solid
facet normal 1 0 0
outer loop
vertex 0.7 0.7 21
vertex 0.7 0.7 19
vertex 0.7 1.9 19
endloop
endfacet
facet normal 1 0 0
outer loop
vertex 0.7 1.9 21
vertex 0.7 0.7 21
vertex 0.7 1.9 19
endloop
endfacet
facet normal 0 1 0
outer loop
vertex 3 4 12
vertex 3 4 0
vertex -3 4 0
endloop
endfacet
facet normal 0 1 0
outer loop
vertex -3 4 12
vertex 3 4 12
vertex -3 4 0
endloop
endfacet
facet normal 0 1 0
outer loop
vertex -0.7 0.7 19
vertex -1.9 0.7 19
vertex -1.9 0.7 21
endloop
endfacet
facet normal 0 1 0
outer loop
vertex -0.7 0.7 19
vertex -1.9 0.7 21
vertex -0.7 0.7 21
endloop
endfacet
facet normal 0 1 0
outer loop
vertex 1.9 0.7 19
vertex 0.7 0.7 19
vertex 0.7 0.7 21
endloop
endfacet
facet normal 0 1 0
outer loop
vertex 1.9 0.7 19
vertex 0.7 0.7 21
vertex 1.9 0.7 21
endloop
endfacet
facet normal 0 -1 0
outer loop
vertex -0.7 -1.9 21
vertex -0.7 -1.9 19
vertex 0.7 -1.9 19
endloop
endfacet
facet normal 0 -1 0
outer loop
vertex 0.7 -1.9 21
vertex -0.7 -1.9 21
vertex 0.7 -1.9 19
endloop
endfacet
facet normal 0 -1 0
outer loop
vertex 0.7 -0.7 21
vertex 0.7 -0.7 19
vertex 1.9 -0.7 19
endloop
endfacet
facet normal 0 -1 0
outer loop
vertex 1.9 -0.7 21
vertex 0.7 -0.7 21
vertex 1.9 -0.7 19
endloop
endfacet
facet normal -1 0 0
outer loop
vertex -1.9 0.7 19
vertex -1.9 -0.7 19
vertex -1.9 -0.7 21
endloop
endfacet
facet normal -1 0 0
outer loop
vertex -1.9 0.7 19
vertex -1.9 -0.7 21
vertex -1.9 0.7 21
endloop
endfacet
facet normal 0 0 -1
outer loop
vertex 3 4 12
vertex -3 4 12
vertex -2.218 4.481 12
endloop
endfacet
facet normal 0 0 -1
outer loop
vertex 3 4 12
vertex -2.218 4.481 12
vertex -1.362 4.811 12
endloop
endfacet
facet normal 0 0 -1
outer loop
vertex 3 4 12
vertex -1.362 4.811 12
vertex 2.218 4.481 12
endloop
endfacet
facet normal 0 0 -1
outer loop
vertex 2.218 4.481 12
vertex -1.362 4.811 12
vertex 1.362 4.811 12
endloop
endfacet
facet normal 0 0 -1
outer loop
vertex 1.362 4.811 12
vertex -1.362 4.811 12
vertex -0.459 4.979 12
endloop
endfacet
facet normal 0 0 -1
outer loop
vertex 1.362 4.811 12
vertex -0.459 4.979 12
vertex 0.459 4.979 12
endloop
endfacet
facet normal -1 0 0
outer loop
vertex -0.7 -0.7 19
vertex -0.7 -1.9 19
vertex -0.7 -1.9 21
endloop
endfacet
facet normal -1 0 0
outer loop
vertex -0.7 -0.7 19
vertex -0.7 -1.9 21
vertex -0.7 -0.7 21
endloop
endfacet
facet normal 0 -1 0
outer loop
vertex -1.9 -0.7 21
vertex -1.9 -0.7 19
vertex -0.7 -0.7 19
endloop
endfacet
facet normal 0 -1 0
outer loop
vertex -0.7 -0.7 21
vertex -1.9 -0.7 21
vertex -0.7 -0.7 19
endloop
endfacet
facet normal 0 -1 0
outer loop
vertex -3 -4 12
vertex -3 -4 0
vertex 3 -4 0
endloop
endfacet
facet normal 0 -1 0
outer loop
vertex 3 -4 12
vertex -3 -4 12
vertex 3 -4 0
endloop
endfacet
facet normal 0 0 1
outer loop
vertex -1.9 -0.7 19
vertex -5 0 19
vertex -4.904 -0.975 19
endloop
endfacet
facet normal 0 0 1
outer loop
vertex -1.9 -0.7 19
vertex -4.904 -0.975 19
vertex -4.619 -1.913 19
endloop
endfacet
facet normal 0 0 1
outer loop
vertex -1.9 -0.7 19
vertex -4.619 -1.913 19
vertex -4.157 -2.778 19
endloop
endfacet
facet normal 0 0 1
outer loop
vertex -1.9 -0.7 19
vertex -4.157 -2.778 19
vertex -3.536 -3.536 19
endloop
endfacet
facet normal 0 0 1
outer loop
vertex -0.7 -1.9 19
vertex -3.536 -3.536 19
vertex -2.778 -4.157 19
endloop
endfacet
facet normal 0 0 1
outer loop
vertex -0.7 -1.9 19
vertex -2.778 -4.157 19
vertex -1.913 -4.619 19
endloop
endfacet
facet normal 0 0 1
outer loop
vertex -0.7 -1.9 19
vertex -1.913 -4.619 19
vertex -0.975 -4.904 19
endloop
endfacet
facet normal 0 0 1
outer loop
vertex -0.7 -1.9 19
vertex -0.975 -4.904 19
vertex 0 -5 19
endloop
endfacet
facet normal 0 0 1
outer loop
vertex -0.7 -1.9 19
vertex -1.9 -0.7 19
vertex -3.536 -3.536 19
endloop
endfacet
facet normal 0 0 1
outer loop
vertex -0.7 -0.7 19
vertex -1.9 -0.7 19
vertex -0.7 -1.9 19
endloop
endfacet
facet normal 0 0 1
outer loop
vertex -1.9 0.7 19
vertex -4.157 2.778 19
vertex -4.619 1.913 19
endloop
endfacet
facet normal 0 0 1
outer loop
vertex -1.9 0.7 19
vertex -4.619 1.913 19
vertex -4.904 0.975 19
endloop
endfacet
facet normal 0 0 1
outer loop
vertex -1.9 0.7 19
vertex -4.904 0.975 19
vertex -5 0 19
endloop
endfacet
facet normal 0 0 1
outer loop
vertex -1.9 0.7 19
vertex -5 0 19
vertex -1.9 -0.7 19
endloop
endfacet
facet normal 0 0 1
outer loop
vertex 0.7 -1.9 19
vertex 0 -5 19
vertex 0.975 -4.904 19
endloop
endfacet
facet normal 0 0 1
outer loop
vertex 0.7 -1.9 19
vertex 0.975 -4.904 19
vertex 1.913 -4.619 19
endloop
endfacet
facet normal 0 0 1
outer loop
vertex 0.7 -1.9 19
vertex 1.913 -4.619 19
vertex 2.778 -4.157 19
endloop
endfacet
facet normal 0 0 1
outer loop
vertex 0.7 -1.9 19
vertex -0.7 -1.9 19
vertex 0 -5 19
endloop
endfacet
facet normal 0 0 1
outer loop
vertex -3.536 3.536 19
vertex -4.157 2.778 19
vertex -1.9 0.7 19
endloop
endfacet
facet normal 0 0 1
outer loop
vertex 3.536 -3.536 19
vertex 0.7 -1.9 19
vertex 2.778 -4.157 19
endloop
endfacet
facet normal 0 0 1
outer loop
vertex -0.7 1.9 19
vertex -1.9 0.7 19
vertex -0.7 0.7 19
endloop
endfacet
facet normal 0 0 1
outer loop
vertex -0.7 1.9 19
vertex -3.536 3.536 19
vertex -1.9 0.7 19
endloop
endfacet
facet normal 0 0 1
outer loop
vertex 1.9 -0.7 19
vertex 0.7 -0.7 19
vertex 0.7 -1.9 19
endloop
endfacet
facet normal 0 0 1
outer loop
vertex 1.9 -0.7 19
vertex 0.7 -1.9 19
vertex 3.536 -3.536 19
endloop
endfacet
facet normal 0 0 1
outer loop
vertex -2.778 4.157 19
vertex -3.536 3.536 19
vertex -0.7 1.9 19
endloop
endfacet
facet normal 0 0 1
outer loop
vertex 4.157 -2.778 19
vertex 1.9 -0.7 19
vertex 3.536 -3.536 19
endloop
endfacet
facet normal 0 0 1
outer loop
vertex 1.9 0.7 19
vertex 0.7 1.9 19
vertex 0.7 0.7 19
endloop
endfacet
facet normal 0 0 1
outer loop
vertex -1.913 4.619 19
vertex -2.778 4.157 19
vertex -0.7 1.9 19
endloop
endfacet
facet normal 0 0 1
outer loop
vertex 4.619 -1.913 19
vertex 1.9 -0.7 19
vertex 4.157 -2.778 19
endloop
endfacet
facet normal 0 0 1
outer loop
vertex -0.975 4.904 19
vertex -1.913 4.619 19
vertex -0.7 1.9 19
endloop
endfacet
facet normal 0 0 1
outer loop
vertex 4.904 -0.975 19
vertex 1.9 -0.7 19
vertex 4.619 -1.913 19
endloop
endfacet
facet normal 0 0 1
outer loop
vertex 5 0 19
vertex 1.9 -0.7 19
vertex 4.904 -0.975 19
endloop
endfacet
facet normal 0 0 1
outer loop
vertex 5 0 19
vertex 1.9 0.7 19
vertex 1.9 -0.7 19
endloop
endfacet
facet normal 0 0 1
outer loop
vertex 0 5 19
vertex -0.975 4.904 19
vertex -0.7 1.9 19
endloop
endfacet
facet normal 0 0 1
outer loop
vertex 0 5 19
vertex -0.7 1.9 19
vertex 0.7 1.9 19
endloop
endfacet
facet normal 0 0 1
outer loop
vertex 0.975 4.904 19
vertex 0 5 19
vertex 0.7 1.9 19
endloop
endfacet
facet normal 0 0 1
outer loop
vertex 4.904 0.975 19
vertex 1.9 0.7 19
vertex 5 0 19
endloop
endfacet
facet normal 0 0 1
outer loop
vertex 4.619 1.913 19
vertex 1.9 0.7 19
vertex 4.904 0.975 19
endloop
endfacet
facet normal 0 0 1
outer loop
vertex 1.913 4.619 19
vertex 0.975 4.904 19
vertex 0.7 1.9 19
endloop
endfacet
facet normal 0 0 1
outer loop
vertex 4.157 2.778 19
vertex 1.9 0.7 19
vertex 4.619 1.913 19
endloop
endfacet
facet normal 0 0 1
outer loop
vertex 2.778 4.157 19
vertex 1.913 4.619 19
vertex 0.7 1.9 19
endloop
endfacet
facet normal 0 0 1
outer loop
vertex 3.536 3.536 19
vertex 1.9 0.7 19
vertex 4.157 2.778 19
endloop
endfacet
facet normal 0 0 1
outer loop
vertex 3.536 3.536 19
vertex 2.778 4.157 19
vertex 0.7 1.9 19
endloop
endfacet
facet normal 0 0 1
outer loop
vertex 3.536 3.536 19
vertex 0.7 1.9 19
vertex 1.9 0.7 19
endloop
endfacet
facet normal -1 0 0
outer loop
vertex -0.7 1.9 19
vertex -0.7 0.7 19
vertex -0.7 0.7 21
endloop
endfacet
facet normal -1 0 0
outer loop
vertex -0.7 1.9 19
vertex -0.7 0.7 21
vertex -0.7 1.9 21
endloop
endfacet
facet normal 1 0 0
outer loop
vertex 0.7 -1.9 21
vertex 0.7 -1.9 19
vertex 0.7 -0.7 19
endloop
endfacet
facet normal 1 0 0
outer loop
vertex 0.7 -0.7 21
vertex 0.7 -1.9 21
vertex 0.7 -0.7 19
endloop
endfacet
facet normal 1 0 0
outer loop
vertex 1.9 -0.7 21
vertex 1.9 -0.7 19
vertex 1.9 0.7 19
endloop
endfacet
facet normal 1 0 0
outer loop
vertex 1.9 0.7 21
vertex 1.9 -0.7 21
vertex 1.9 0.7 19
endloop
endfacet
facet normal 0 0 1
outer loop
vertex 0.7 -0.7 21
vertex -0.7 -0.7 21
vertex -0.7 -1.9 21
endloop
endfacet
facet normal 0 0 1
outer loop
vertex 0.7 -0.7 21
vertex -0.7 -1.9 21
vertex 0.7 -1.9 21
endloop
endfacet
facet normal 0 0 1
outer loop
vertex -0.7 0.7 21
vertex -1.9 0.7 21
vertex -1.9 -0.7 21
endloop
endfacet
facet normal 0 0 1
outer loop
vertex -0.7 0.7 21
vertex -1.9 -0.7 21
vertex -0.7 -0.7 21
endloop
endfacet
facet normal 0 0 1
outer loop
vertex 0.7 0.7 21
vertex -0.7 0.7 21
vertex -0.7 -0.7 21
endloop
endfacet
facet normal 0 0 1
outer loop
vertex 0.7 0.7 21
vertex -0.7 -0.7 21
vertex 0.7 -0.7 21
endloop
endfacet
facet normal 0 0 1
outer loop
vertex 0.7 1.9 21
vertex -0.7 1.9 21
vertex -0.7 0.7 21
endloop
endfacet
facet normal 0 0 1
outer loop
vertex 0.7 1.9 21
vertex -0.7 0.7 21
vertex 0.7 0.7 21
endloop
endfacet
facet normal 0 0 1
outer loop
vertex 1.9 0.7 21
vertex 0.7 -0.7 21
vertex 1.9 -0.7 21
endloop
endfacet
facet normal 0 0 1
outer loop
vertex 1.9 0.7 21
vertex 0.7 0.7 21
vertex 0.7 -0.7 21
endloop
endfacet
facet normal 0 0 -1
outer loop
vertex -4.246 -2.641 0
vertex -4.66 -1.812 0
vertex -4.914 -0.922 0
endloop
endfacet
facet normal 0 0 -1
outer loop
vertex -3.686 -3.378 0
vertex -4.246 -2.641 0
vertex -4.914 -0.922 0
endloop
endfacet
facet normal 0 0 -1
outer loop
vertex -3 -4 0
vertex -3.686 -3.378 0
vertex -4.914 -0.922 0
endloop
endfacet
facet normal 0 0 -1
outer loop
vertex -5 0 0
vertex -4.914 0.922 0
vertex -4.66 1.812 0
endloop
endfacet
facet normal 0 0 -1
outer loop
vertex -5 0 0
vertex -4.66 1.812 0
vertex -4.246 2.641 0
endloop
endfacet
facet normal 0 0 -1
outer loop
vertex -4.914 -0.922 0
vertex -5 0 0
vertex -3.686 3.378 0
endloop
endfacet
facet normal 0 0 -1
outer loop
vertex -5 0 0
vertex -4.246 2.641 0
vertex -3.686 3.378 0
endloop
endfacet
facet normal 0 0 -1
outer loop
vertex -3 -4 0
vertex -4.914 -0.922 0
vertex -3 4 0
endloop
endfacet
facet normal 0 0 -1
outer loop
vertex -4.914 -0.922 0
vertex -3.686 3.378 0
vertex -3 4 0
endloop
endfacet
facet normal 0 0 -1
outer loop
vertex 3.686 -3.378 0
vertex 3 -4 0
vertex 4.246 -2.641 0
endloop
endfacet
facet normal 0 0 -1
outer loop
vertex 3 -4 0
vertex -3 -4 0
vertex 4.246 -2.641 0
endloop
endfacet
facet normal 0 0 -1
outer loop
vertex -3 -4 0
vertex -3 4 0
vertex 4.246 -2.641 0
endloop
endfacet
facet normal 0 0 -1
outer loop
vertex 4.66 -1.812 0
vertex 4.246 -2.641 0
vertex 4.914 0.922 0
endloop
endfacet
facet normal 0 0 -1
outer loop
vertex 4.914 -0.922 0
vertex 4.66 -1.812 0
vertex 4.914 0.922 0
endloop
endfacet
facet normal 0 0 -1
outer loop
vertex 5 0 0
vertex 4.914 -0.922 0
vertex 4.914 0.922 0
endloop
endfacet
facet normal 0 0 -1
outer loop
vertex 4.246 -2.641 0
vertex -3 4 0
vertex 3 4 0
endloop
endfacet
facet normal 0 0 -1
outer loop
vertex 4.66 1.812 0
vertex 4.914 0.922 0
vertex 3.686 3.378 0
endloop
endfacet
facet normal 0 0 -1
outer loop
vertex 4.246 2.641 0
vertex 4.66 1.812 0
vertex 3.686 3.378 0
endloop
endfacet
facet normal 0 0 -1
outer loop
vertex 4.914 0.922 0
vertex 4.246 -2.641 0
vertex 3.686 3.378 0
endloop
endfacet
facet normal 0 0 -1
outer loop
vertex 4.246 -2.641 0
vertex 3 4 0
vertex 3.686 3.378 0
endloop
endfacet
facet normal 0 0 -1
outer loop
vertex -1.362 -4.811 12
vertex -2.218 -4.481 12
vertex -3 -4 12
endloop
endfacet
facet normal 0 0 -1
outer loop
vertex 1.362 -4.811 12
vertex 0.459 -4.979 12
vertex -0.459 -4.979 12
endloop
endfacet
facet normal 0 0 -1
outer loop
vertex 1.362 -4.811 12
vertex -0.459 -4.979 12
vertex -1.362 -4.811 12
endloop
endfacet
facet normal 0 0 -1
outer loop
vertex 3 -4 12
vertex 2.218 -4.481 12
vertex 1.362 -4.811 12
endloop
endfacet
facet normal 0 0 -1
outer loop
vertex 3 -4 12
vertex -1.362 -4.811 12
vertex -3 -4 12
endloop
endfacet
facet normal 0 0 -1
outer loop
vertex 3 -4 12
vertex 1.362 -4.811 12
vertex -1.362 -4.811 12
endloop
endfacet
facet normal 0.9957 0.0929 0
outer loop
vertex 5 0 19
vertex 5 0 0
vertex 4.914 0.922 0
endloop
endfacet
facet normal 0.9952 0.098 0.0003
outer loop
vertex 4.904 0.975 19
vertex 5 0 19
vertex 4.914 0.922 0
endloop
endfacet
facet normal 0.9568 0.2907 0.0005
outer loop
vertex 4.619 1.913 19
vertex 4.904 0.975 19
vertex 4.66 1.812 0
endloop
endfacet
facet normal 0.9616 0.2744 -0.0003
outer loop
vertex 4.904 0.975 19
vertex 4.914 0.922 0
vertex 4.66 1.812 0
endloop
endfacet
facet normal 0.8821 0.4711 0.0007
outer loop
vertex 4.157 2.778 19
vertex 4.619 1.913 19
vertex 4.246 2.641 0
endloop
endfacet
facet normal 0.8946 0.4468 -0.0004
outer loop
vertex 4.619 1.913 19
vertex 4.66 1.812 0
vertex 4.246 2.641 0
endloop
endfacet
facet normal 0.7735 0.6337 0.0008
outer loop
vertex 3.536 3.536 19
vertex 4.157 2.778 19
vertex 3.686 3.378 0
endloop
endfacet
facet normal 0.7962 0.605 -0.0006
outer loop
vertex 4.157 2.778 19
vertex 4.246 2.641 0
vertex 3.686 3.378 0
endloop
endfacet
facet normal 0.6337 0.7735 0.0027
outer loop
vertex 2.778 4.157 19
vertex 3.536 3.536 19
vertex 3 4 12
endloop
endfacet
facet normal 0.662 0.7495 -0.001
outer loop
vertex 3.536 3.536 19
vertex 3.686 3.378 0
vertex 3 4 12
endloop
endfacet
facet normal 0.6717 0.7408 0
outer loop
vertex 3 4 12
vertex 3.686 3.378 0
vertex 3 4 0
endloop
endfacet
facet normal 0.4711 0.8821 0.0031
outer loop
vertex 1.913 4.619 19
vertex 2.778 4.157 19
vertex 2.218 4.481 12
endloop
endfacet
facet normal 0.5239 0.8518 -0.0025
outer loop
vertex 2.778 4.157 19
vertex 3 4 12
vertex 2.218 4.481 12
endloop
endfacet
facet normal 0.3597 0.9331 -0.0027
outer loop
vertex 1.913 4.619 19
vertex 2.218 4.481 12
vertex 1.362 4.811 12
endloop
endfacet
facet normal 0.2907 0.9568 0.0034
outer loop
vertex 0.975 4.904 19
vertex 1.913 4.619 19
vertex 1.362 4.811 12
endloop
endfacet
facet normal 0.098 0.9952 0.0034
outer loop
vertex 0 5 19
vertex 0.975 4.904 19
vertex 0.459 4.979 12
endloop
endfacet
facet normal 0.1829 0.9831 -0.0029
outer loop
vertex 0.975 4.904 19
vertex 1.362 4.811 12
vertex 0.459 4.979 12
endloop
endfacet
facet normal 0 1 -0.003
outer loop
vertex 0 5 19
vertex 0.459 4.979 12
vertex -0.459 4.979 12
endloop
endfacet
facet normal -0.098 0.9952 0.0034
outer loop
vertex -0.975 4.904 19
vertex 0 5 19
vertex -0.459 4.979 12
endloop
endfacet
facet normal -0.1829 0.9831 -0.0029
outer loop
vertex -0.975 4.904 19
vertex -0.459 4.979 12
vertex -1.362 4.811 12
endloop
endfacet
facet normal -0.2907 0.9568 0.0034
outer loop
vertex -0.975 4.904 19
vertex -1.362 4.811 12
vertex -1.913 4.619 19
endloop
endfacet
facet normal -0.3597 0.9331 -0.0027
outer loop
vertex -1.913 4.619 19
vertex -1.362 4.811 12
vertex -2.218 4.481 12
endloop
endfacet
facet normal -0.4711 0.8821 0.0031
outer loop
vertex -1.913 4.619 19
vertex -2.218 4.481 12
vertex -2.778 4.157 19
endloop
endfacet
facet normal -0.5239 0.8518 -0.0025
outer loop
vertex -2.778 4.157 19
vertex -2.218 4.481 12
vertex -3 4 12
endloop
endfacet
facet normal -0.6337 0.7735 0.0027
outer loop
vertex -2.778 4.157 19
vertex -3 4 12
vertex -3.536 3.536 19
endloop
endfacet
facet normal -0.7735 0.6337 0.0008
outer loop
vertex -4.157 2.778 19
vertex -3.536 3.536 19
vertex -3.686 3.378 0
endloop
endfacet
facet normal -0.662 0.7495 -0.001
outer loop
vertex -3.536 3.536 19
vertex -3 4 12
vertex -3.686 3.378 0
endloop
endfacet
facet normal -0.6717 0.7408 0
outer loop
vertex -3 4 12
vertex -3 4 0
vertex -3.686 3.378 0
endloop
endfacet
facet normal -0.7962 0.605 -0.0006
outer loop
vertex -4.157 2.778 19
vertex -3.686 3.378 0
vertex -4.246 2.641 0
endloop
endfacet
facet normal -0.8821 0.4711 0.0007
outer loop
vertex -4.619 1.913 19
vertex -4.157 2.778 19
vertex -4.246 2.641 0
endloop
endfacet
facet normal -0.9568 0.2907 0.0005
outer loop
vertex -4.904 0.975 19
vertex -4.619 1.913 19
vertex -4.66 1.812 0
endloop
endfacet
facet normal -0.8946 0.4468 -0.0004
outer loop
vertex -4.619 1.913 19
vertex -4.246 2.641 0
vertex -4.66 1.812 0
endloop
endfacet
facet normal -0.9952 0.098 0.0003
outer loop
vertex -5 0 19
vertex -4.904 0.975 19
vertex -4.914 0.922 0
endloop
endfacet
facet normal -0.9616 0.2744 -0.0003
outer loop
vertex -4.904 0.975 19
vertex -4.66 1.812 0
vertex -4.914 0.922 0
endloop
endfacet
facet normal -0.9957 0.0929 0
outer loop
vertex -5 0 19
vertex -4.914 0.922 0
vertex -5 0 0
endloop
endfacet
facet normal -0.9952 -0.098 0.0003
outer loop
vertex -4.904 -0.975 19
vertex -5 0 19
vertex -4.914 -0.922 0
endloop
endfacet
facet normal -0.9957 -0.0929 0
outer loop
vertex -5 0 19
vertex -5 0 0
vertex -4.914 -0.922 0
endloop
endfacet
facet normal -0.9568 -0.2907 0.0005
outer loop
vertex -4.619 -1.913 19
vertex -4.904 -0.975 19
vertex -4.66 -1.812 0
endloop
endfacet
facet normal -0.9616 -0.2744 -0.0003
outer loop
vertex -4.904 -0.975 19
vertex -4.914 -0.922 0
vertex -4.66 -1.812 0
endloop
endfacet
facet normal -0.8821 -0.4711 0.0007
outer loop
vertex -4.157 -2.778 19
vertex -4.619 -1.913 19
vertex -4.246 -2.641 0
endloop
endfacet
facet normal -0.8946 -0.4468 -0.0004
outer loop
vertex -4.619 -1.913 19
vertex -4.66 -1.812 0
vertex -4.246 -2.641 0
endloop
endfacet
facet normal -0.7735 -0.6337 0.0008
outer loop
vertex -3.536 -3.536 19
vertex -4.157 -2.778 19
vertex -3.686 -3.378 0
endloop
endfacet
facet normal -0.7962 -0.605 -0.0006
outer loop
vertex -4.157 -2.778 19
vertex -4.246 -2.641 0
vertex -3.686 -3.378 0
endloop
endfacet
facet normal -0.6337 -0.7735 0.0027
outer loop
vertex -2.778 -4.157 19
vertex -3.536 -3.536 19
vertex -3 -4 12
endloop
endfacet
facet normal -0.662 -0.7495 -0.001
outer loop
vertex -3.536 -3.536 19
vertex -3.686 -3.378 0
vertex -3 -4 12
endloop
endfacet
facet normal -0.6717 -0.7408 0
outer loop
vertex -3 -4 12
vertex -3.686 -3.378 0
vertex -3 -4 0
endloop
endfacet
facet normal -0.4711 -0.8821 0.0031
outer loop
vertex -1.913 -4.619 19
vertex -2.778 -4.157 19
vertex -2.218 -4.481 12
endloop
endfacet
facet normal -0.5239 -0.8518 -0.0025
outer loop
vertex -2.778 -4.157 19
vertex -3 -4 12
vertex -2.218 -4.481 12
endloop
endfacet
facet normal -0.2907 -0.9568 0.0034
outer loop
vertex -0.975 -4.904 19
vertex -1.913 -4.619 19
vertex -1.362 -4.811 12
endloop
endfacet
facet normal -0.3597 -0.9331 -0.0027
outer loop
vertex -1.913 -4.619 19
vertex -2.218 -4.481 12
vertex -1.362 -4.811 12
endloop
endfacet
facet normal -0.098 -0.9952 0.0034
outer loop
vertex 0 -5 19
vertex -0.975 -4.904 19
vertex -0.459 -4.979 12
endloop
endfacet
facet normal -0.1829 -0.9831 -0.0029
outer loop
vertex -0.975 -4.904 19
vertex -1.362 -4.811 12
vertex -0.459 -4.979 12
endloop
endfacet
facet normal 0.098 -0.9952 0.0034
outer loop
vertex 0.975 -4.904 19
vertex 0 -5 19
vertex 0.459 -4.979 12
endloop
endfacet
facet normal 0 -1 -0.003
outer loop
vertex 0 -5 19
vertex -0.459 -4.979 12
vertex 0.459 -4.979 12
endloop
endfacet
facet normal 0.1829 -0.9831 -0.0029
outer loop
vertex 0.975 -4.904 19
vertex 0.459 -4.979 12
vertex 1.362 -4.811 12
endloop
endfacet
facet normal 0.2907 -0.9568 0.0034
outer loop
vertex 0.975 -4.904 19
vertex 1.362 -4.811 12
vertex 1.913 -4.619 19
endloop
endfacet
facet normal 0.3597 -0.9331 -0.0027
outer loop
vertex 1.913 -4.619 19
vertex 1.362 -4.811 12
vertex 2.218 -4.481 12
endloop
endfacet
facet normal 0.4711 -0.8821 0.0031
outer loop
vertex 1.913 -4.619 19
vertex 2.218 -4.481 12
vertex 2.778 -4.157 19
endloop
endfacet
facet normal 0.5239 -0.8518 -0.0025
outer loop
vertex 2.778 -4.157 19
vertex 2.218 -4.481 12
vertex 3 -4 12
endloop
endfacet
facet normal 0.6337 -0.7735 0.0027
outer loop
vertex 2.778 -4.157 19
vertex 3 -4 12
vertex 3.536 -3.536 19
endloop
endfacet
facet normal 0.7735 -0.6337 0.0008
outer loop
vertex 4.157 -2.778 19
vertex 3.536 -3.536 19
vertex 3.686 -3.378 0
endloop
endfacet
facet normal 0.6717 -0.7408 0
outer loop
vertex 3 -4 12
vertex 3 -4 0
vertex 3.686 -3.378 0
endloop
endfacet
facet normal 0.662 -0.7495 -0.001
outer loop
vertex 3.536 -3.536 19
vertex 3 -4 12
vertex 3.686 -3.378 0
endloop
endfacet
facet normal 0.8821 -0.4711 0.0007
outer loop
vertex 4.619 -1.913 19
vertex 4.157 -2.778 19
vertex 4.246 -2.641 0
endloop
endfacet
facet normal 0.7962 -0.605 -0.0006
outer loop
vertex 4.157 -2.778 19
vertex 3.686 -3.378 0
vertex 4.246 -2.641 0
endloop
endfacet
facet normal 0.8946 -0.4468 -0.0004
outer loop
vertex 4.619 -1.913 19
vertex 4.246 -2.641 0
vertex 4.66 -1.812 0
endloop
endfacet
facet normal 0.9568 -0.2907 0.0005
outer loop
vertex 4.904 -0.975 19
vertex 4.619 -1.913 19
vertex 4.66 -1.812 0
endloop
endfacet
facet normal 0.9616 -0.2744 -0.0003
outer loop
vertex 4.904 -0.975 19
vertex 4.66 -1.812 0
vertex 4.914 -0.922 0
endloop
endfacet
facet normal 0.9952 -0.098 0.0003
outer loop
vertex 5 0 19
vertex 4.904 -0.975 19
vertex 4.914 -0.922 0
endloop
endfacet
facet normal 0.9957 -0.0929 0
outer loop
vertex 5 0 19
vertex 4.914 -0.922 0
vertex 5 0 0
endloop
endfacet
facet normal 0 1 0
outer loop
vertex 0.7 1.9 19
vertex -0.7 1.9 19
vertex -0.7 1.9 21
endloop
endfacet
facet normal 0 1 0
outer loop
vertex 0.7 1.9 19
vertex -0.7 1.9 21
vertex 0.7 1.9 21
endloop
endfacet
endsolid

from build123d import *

# Parameters (mm, degrees)
F0_R     = 5
F1_DEPTH = 19
F3_DEPTH = 12
F4_W     = 1.4
F4_H     = 1.2
F4_W_2   = 1.2
F4_H_2   = 1.4
F5_DEPTH = 2


with BuildPart() as f1:
    # F0 (on Top) → F1 (new body)
    with BuildSketch(Plane.XY):
        Circle(F0_R)
    extrude(amount=F1_DEPTH)

    # F2 (on face) → F3 (cut)
    with BuildSketch(Plane(origin=(0, 0, 0), x_dir=(1, 0, 0), z_dir=(0, 0, -1))):
        with BuildLine():
            Line((-3, 4), (3, 4))
            ThreePointArc((3, 4), (0, 5), (-3, 4))
        make_face()
        with BuildLine():
            ThreePointArc((-3, -4), (0, -5), (3, -4))
            Line((3, -4), (-3, -4))
        make_face()
    extrude(amount=-F3_DEPTH, mode=Mode.SUBTRACT)

    # F4 (on face) → F5 (join)
    with BuildSketch(Plane.XY.offset(19)):
        with Locations((0, 1.3)):
            Rectangle(F4_W, F4_H)
        with Locations((-1.3, 0)):
            Rectangle(F4_W_2, F4_H_2)
        Rectangle(F4_W, F4_H_2)
        with Locations((0, -1.3)):
            Rectangle(F4_W, F4_H)
        with Locations((1.3, 0)):
            Rectangle(F4_W_2, F4_H_2)
    extrude(amount=F5_DEPTH)


solid = f1.part
